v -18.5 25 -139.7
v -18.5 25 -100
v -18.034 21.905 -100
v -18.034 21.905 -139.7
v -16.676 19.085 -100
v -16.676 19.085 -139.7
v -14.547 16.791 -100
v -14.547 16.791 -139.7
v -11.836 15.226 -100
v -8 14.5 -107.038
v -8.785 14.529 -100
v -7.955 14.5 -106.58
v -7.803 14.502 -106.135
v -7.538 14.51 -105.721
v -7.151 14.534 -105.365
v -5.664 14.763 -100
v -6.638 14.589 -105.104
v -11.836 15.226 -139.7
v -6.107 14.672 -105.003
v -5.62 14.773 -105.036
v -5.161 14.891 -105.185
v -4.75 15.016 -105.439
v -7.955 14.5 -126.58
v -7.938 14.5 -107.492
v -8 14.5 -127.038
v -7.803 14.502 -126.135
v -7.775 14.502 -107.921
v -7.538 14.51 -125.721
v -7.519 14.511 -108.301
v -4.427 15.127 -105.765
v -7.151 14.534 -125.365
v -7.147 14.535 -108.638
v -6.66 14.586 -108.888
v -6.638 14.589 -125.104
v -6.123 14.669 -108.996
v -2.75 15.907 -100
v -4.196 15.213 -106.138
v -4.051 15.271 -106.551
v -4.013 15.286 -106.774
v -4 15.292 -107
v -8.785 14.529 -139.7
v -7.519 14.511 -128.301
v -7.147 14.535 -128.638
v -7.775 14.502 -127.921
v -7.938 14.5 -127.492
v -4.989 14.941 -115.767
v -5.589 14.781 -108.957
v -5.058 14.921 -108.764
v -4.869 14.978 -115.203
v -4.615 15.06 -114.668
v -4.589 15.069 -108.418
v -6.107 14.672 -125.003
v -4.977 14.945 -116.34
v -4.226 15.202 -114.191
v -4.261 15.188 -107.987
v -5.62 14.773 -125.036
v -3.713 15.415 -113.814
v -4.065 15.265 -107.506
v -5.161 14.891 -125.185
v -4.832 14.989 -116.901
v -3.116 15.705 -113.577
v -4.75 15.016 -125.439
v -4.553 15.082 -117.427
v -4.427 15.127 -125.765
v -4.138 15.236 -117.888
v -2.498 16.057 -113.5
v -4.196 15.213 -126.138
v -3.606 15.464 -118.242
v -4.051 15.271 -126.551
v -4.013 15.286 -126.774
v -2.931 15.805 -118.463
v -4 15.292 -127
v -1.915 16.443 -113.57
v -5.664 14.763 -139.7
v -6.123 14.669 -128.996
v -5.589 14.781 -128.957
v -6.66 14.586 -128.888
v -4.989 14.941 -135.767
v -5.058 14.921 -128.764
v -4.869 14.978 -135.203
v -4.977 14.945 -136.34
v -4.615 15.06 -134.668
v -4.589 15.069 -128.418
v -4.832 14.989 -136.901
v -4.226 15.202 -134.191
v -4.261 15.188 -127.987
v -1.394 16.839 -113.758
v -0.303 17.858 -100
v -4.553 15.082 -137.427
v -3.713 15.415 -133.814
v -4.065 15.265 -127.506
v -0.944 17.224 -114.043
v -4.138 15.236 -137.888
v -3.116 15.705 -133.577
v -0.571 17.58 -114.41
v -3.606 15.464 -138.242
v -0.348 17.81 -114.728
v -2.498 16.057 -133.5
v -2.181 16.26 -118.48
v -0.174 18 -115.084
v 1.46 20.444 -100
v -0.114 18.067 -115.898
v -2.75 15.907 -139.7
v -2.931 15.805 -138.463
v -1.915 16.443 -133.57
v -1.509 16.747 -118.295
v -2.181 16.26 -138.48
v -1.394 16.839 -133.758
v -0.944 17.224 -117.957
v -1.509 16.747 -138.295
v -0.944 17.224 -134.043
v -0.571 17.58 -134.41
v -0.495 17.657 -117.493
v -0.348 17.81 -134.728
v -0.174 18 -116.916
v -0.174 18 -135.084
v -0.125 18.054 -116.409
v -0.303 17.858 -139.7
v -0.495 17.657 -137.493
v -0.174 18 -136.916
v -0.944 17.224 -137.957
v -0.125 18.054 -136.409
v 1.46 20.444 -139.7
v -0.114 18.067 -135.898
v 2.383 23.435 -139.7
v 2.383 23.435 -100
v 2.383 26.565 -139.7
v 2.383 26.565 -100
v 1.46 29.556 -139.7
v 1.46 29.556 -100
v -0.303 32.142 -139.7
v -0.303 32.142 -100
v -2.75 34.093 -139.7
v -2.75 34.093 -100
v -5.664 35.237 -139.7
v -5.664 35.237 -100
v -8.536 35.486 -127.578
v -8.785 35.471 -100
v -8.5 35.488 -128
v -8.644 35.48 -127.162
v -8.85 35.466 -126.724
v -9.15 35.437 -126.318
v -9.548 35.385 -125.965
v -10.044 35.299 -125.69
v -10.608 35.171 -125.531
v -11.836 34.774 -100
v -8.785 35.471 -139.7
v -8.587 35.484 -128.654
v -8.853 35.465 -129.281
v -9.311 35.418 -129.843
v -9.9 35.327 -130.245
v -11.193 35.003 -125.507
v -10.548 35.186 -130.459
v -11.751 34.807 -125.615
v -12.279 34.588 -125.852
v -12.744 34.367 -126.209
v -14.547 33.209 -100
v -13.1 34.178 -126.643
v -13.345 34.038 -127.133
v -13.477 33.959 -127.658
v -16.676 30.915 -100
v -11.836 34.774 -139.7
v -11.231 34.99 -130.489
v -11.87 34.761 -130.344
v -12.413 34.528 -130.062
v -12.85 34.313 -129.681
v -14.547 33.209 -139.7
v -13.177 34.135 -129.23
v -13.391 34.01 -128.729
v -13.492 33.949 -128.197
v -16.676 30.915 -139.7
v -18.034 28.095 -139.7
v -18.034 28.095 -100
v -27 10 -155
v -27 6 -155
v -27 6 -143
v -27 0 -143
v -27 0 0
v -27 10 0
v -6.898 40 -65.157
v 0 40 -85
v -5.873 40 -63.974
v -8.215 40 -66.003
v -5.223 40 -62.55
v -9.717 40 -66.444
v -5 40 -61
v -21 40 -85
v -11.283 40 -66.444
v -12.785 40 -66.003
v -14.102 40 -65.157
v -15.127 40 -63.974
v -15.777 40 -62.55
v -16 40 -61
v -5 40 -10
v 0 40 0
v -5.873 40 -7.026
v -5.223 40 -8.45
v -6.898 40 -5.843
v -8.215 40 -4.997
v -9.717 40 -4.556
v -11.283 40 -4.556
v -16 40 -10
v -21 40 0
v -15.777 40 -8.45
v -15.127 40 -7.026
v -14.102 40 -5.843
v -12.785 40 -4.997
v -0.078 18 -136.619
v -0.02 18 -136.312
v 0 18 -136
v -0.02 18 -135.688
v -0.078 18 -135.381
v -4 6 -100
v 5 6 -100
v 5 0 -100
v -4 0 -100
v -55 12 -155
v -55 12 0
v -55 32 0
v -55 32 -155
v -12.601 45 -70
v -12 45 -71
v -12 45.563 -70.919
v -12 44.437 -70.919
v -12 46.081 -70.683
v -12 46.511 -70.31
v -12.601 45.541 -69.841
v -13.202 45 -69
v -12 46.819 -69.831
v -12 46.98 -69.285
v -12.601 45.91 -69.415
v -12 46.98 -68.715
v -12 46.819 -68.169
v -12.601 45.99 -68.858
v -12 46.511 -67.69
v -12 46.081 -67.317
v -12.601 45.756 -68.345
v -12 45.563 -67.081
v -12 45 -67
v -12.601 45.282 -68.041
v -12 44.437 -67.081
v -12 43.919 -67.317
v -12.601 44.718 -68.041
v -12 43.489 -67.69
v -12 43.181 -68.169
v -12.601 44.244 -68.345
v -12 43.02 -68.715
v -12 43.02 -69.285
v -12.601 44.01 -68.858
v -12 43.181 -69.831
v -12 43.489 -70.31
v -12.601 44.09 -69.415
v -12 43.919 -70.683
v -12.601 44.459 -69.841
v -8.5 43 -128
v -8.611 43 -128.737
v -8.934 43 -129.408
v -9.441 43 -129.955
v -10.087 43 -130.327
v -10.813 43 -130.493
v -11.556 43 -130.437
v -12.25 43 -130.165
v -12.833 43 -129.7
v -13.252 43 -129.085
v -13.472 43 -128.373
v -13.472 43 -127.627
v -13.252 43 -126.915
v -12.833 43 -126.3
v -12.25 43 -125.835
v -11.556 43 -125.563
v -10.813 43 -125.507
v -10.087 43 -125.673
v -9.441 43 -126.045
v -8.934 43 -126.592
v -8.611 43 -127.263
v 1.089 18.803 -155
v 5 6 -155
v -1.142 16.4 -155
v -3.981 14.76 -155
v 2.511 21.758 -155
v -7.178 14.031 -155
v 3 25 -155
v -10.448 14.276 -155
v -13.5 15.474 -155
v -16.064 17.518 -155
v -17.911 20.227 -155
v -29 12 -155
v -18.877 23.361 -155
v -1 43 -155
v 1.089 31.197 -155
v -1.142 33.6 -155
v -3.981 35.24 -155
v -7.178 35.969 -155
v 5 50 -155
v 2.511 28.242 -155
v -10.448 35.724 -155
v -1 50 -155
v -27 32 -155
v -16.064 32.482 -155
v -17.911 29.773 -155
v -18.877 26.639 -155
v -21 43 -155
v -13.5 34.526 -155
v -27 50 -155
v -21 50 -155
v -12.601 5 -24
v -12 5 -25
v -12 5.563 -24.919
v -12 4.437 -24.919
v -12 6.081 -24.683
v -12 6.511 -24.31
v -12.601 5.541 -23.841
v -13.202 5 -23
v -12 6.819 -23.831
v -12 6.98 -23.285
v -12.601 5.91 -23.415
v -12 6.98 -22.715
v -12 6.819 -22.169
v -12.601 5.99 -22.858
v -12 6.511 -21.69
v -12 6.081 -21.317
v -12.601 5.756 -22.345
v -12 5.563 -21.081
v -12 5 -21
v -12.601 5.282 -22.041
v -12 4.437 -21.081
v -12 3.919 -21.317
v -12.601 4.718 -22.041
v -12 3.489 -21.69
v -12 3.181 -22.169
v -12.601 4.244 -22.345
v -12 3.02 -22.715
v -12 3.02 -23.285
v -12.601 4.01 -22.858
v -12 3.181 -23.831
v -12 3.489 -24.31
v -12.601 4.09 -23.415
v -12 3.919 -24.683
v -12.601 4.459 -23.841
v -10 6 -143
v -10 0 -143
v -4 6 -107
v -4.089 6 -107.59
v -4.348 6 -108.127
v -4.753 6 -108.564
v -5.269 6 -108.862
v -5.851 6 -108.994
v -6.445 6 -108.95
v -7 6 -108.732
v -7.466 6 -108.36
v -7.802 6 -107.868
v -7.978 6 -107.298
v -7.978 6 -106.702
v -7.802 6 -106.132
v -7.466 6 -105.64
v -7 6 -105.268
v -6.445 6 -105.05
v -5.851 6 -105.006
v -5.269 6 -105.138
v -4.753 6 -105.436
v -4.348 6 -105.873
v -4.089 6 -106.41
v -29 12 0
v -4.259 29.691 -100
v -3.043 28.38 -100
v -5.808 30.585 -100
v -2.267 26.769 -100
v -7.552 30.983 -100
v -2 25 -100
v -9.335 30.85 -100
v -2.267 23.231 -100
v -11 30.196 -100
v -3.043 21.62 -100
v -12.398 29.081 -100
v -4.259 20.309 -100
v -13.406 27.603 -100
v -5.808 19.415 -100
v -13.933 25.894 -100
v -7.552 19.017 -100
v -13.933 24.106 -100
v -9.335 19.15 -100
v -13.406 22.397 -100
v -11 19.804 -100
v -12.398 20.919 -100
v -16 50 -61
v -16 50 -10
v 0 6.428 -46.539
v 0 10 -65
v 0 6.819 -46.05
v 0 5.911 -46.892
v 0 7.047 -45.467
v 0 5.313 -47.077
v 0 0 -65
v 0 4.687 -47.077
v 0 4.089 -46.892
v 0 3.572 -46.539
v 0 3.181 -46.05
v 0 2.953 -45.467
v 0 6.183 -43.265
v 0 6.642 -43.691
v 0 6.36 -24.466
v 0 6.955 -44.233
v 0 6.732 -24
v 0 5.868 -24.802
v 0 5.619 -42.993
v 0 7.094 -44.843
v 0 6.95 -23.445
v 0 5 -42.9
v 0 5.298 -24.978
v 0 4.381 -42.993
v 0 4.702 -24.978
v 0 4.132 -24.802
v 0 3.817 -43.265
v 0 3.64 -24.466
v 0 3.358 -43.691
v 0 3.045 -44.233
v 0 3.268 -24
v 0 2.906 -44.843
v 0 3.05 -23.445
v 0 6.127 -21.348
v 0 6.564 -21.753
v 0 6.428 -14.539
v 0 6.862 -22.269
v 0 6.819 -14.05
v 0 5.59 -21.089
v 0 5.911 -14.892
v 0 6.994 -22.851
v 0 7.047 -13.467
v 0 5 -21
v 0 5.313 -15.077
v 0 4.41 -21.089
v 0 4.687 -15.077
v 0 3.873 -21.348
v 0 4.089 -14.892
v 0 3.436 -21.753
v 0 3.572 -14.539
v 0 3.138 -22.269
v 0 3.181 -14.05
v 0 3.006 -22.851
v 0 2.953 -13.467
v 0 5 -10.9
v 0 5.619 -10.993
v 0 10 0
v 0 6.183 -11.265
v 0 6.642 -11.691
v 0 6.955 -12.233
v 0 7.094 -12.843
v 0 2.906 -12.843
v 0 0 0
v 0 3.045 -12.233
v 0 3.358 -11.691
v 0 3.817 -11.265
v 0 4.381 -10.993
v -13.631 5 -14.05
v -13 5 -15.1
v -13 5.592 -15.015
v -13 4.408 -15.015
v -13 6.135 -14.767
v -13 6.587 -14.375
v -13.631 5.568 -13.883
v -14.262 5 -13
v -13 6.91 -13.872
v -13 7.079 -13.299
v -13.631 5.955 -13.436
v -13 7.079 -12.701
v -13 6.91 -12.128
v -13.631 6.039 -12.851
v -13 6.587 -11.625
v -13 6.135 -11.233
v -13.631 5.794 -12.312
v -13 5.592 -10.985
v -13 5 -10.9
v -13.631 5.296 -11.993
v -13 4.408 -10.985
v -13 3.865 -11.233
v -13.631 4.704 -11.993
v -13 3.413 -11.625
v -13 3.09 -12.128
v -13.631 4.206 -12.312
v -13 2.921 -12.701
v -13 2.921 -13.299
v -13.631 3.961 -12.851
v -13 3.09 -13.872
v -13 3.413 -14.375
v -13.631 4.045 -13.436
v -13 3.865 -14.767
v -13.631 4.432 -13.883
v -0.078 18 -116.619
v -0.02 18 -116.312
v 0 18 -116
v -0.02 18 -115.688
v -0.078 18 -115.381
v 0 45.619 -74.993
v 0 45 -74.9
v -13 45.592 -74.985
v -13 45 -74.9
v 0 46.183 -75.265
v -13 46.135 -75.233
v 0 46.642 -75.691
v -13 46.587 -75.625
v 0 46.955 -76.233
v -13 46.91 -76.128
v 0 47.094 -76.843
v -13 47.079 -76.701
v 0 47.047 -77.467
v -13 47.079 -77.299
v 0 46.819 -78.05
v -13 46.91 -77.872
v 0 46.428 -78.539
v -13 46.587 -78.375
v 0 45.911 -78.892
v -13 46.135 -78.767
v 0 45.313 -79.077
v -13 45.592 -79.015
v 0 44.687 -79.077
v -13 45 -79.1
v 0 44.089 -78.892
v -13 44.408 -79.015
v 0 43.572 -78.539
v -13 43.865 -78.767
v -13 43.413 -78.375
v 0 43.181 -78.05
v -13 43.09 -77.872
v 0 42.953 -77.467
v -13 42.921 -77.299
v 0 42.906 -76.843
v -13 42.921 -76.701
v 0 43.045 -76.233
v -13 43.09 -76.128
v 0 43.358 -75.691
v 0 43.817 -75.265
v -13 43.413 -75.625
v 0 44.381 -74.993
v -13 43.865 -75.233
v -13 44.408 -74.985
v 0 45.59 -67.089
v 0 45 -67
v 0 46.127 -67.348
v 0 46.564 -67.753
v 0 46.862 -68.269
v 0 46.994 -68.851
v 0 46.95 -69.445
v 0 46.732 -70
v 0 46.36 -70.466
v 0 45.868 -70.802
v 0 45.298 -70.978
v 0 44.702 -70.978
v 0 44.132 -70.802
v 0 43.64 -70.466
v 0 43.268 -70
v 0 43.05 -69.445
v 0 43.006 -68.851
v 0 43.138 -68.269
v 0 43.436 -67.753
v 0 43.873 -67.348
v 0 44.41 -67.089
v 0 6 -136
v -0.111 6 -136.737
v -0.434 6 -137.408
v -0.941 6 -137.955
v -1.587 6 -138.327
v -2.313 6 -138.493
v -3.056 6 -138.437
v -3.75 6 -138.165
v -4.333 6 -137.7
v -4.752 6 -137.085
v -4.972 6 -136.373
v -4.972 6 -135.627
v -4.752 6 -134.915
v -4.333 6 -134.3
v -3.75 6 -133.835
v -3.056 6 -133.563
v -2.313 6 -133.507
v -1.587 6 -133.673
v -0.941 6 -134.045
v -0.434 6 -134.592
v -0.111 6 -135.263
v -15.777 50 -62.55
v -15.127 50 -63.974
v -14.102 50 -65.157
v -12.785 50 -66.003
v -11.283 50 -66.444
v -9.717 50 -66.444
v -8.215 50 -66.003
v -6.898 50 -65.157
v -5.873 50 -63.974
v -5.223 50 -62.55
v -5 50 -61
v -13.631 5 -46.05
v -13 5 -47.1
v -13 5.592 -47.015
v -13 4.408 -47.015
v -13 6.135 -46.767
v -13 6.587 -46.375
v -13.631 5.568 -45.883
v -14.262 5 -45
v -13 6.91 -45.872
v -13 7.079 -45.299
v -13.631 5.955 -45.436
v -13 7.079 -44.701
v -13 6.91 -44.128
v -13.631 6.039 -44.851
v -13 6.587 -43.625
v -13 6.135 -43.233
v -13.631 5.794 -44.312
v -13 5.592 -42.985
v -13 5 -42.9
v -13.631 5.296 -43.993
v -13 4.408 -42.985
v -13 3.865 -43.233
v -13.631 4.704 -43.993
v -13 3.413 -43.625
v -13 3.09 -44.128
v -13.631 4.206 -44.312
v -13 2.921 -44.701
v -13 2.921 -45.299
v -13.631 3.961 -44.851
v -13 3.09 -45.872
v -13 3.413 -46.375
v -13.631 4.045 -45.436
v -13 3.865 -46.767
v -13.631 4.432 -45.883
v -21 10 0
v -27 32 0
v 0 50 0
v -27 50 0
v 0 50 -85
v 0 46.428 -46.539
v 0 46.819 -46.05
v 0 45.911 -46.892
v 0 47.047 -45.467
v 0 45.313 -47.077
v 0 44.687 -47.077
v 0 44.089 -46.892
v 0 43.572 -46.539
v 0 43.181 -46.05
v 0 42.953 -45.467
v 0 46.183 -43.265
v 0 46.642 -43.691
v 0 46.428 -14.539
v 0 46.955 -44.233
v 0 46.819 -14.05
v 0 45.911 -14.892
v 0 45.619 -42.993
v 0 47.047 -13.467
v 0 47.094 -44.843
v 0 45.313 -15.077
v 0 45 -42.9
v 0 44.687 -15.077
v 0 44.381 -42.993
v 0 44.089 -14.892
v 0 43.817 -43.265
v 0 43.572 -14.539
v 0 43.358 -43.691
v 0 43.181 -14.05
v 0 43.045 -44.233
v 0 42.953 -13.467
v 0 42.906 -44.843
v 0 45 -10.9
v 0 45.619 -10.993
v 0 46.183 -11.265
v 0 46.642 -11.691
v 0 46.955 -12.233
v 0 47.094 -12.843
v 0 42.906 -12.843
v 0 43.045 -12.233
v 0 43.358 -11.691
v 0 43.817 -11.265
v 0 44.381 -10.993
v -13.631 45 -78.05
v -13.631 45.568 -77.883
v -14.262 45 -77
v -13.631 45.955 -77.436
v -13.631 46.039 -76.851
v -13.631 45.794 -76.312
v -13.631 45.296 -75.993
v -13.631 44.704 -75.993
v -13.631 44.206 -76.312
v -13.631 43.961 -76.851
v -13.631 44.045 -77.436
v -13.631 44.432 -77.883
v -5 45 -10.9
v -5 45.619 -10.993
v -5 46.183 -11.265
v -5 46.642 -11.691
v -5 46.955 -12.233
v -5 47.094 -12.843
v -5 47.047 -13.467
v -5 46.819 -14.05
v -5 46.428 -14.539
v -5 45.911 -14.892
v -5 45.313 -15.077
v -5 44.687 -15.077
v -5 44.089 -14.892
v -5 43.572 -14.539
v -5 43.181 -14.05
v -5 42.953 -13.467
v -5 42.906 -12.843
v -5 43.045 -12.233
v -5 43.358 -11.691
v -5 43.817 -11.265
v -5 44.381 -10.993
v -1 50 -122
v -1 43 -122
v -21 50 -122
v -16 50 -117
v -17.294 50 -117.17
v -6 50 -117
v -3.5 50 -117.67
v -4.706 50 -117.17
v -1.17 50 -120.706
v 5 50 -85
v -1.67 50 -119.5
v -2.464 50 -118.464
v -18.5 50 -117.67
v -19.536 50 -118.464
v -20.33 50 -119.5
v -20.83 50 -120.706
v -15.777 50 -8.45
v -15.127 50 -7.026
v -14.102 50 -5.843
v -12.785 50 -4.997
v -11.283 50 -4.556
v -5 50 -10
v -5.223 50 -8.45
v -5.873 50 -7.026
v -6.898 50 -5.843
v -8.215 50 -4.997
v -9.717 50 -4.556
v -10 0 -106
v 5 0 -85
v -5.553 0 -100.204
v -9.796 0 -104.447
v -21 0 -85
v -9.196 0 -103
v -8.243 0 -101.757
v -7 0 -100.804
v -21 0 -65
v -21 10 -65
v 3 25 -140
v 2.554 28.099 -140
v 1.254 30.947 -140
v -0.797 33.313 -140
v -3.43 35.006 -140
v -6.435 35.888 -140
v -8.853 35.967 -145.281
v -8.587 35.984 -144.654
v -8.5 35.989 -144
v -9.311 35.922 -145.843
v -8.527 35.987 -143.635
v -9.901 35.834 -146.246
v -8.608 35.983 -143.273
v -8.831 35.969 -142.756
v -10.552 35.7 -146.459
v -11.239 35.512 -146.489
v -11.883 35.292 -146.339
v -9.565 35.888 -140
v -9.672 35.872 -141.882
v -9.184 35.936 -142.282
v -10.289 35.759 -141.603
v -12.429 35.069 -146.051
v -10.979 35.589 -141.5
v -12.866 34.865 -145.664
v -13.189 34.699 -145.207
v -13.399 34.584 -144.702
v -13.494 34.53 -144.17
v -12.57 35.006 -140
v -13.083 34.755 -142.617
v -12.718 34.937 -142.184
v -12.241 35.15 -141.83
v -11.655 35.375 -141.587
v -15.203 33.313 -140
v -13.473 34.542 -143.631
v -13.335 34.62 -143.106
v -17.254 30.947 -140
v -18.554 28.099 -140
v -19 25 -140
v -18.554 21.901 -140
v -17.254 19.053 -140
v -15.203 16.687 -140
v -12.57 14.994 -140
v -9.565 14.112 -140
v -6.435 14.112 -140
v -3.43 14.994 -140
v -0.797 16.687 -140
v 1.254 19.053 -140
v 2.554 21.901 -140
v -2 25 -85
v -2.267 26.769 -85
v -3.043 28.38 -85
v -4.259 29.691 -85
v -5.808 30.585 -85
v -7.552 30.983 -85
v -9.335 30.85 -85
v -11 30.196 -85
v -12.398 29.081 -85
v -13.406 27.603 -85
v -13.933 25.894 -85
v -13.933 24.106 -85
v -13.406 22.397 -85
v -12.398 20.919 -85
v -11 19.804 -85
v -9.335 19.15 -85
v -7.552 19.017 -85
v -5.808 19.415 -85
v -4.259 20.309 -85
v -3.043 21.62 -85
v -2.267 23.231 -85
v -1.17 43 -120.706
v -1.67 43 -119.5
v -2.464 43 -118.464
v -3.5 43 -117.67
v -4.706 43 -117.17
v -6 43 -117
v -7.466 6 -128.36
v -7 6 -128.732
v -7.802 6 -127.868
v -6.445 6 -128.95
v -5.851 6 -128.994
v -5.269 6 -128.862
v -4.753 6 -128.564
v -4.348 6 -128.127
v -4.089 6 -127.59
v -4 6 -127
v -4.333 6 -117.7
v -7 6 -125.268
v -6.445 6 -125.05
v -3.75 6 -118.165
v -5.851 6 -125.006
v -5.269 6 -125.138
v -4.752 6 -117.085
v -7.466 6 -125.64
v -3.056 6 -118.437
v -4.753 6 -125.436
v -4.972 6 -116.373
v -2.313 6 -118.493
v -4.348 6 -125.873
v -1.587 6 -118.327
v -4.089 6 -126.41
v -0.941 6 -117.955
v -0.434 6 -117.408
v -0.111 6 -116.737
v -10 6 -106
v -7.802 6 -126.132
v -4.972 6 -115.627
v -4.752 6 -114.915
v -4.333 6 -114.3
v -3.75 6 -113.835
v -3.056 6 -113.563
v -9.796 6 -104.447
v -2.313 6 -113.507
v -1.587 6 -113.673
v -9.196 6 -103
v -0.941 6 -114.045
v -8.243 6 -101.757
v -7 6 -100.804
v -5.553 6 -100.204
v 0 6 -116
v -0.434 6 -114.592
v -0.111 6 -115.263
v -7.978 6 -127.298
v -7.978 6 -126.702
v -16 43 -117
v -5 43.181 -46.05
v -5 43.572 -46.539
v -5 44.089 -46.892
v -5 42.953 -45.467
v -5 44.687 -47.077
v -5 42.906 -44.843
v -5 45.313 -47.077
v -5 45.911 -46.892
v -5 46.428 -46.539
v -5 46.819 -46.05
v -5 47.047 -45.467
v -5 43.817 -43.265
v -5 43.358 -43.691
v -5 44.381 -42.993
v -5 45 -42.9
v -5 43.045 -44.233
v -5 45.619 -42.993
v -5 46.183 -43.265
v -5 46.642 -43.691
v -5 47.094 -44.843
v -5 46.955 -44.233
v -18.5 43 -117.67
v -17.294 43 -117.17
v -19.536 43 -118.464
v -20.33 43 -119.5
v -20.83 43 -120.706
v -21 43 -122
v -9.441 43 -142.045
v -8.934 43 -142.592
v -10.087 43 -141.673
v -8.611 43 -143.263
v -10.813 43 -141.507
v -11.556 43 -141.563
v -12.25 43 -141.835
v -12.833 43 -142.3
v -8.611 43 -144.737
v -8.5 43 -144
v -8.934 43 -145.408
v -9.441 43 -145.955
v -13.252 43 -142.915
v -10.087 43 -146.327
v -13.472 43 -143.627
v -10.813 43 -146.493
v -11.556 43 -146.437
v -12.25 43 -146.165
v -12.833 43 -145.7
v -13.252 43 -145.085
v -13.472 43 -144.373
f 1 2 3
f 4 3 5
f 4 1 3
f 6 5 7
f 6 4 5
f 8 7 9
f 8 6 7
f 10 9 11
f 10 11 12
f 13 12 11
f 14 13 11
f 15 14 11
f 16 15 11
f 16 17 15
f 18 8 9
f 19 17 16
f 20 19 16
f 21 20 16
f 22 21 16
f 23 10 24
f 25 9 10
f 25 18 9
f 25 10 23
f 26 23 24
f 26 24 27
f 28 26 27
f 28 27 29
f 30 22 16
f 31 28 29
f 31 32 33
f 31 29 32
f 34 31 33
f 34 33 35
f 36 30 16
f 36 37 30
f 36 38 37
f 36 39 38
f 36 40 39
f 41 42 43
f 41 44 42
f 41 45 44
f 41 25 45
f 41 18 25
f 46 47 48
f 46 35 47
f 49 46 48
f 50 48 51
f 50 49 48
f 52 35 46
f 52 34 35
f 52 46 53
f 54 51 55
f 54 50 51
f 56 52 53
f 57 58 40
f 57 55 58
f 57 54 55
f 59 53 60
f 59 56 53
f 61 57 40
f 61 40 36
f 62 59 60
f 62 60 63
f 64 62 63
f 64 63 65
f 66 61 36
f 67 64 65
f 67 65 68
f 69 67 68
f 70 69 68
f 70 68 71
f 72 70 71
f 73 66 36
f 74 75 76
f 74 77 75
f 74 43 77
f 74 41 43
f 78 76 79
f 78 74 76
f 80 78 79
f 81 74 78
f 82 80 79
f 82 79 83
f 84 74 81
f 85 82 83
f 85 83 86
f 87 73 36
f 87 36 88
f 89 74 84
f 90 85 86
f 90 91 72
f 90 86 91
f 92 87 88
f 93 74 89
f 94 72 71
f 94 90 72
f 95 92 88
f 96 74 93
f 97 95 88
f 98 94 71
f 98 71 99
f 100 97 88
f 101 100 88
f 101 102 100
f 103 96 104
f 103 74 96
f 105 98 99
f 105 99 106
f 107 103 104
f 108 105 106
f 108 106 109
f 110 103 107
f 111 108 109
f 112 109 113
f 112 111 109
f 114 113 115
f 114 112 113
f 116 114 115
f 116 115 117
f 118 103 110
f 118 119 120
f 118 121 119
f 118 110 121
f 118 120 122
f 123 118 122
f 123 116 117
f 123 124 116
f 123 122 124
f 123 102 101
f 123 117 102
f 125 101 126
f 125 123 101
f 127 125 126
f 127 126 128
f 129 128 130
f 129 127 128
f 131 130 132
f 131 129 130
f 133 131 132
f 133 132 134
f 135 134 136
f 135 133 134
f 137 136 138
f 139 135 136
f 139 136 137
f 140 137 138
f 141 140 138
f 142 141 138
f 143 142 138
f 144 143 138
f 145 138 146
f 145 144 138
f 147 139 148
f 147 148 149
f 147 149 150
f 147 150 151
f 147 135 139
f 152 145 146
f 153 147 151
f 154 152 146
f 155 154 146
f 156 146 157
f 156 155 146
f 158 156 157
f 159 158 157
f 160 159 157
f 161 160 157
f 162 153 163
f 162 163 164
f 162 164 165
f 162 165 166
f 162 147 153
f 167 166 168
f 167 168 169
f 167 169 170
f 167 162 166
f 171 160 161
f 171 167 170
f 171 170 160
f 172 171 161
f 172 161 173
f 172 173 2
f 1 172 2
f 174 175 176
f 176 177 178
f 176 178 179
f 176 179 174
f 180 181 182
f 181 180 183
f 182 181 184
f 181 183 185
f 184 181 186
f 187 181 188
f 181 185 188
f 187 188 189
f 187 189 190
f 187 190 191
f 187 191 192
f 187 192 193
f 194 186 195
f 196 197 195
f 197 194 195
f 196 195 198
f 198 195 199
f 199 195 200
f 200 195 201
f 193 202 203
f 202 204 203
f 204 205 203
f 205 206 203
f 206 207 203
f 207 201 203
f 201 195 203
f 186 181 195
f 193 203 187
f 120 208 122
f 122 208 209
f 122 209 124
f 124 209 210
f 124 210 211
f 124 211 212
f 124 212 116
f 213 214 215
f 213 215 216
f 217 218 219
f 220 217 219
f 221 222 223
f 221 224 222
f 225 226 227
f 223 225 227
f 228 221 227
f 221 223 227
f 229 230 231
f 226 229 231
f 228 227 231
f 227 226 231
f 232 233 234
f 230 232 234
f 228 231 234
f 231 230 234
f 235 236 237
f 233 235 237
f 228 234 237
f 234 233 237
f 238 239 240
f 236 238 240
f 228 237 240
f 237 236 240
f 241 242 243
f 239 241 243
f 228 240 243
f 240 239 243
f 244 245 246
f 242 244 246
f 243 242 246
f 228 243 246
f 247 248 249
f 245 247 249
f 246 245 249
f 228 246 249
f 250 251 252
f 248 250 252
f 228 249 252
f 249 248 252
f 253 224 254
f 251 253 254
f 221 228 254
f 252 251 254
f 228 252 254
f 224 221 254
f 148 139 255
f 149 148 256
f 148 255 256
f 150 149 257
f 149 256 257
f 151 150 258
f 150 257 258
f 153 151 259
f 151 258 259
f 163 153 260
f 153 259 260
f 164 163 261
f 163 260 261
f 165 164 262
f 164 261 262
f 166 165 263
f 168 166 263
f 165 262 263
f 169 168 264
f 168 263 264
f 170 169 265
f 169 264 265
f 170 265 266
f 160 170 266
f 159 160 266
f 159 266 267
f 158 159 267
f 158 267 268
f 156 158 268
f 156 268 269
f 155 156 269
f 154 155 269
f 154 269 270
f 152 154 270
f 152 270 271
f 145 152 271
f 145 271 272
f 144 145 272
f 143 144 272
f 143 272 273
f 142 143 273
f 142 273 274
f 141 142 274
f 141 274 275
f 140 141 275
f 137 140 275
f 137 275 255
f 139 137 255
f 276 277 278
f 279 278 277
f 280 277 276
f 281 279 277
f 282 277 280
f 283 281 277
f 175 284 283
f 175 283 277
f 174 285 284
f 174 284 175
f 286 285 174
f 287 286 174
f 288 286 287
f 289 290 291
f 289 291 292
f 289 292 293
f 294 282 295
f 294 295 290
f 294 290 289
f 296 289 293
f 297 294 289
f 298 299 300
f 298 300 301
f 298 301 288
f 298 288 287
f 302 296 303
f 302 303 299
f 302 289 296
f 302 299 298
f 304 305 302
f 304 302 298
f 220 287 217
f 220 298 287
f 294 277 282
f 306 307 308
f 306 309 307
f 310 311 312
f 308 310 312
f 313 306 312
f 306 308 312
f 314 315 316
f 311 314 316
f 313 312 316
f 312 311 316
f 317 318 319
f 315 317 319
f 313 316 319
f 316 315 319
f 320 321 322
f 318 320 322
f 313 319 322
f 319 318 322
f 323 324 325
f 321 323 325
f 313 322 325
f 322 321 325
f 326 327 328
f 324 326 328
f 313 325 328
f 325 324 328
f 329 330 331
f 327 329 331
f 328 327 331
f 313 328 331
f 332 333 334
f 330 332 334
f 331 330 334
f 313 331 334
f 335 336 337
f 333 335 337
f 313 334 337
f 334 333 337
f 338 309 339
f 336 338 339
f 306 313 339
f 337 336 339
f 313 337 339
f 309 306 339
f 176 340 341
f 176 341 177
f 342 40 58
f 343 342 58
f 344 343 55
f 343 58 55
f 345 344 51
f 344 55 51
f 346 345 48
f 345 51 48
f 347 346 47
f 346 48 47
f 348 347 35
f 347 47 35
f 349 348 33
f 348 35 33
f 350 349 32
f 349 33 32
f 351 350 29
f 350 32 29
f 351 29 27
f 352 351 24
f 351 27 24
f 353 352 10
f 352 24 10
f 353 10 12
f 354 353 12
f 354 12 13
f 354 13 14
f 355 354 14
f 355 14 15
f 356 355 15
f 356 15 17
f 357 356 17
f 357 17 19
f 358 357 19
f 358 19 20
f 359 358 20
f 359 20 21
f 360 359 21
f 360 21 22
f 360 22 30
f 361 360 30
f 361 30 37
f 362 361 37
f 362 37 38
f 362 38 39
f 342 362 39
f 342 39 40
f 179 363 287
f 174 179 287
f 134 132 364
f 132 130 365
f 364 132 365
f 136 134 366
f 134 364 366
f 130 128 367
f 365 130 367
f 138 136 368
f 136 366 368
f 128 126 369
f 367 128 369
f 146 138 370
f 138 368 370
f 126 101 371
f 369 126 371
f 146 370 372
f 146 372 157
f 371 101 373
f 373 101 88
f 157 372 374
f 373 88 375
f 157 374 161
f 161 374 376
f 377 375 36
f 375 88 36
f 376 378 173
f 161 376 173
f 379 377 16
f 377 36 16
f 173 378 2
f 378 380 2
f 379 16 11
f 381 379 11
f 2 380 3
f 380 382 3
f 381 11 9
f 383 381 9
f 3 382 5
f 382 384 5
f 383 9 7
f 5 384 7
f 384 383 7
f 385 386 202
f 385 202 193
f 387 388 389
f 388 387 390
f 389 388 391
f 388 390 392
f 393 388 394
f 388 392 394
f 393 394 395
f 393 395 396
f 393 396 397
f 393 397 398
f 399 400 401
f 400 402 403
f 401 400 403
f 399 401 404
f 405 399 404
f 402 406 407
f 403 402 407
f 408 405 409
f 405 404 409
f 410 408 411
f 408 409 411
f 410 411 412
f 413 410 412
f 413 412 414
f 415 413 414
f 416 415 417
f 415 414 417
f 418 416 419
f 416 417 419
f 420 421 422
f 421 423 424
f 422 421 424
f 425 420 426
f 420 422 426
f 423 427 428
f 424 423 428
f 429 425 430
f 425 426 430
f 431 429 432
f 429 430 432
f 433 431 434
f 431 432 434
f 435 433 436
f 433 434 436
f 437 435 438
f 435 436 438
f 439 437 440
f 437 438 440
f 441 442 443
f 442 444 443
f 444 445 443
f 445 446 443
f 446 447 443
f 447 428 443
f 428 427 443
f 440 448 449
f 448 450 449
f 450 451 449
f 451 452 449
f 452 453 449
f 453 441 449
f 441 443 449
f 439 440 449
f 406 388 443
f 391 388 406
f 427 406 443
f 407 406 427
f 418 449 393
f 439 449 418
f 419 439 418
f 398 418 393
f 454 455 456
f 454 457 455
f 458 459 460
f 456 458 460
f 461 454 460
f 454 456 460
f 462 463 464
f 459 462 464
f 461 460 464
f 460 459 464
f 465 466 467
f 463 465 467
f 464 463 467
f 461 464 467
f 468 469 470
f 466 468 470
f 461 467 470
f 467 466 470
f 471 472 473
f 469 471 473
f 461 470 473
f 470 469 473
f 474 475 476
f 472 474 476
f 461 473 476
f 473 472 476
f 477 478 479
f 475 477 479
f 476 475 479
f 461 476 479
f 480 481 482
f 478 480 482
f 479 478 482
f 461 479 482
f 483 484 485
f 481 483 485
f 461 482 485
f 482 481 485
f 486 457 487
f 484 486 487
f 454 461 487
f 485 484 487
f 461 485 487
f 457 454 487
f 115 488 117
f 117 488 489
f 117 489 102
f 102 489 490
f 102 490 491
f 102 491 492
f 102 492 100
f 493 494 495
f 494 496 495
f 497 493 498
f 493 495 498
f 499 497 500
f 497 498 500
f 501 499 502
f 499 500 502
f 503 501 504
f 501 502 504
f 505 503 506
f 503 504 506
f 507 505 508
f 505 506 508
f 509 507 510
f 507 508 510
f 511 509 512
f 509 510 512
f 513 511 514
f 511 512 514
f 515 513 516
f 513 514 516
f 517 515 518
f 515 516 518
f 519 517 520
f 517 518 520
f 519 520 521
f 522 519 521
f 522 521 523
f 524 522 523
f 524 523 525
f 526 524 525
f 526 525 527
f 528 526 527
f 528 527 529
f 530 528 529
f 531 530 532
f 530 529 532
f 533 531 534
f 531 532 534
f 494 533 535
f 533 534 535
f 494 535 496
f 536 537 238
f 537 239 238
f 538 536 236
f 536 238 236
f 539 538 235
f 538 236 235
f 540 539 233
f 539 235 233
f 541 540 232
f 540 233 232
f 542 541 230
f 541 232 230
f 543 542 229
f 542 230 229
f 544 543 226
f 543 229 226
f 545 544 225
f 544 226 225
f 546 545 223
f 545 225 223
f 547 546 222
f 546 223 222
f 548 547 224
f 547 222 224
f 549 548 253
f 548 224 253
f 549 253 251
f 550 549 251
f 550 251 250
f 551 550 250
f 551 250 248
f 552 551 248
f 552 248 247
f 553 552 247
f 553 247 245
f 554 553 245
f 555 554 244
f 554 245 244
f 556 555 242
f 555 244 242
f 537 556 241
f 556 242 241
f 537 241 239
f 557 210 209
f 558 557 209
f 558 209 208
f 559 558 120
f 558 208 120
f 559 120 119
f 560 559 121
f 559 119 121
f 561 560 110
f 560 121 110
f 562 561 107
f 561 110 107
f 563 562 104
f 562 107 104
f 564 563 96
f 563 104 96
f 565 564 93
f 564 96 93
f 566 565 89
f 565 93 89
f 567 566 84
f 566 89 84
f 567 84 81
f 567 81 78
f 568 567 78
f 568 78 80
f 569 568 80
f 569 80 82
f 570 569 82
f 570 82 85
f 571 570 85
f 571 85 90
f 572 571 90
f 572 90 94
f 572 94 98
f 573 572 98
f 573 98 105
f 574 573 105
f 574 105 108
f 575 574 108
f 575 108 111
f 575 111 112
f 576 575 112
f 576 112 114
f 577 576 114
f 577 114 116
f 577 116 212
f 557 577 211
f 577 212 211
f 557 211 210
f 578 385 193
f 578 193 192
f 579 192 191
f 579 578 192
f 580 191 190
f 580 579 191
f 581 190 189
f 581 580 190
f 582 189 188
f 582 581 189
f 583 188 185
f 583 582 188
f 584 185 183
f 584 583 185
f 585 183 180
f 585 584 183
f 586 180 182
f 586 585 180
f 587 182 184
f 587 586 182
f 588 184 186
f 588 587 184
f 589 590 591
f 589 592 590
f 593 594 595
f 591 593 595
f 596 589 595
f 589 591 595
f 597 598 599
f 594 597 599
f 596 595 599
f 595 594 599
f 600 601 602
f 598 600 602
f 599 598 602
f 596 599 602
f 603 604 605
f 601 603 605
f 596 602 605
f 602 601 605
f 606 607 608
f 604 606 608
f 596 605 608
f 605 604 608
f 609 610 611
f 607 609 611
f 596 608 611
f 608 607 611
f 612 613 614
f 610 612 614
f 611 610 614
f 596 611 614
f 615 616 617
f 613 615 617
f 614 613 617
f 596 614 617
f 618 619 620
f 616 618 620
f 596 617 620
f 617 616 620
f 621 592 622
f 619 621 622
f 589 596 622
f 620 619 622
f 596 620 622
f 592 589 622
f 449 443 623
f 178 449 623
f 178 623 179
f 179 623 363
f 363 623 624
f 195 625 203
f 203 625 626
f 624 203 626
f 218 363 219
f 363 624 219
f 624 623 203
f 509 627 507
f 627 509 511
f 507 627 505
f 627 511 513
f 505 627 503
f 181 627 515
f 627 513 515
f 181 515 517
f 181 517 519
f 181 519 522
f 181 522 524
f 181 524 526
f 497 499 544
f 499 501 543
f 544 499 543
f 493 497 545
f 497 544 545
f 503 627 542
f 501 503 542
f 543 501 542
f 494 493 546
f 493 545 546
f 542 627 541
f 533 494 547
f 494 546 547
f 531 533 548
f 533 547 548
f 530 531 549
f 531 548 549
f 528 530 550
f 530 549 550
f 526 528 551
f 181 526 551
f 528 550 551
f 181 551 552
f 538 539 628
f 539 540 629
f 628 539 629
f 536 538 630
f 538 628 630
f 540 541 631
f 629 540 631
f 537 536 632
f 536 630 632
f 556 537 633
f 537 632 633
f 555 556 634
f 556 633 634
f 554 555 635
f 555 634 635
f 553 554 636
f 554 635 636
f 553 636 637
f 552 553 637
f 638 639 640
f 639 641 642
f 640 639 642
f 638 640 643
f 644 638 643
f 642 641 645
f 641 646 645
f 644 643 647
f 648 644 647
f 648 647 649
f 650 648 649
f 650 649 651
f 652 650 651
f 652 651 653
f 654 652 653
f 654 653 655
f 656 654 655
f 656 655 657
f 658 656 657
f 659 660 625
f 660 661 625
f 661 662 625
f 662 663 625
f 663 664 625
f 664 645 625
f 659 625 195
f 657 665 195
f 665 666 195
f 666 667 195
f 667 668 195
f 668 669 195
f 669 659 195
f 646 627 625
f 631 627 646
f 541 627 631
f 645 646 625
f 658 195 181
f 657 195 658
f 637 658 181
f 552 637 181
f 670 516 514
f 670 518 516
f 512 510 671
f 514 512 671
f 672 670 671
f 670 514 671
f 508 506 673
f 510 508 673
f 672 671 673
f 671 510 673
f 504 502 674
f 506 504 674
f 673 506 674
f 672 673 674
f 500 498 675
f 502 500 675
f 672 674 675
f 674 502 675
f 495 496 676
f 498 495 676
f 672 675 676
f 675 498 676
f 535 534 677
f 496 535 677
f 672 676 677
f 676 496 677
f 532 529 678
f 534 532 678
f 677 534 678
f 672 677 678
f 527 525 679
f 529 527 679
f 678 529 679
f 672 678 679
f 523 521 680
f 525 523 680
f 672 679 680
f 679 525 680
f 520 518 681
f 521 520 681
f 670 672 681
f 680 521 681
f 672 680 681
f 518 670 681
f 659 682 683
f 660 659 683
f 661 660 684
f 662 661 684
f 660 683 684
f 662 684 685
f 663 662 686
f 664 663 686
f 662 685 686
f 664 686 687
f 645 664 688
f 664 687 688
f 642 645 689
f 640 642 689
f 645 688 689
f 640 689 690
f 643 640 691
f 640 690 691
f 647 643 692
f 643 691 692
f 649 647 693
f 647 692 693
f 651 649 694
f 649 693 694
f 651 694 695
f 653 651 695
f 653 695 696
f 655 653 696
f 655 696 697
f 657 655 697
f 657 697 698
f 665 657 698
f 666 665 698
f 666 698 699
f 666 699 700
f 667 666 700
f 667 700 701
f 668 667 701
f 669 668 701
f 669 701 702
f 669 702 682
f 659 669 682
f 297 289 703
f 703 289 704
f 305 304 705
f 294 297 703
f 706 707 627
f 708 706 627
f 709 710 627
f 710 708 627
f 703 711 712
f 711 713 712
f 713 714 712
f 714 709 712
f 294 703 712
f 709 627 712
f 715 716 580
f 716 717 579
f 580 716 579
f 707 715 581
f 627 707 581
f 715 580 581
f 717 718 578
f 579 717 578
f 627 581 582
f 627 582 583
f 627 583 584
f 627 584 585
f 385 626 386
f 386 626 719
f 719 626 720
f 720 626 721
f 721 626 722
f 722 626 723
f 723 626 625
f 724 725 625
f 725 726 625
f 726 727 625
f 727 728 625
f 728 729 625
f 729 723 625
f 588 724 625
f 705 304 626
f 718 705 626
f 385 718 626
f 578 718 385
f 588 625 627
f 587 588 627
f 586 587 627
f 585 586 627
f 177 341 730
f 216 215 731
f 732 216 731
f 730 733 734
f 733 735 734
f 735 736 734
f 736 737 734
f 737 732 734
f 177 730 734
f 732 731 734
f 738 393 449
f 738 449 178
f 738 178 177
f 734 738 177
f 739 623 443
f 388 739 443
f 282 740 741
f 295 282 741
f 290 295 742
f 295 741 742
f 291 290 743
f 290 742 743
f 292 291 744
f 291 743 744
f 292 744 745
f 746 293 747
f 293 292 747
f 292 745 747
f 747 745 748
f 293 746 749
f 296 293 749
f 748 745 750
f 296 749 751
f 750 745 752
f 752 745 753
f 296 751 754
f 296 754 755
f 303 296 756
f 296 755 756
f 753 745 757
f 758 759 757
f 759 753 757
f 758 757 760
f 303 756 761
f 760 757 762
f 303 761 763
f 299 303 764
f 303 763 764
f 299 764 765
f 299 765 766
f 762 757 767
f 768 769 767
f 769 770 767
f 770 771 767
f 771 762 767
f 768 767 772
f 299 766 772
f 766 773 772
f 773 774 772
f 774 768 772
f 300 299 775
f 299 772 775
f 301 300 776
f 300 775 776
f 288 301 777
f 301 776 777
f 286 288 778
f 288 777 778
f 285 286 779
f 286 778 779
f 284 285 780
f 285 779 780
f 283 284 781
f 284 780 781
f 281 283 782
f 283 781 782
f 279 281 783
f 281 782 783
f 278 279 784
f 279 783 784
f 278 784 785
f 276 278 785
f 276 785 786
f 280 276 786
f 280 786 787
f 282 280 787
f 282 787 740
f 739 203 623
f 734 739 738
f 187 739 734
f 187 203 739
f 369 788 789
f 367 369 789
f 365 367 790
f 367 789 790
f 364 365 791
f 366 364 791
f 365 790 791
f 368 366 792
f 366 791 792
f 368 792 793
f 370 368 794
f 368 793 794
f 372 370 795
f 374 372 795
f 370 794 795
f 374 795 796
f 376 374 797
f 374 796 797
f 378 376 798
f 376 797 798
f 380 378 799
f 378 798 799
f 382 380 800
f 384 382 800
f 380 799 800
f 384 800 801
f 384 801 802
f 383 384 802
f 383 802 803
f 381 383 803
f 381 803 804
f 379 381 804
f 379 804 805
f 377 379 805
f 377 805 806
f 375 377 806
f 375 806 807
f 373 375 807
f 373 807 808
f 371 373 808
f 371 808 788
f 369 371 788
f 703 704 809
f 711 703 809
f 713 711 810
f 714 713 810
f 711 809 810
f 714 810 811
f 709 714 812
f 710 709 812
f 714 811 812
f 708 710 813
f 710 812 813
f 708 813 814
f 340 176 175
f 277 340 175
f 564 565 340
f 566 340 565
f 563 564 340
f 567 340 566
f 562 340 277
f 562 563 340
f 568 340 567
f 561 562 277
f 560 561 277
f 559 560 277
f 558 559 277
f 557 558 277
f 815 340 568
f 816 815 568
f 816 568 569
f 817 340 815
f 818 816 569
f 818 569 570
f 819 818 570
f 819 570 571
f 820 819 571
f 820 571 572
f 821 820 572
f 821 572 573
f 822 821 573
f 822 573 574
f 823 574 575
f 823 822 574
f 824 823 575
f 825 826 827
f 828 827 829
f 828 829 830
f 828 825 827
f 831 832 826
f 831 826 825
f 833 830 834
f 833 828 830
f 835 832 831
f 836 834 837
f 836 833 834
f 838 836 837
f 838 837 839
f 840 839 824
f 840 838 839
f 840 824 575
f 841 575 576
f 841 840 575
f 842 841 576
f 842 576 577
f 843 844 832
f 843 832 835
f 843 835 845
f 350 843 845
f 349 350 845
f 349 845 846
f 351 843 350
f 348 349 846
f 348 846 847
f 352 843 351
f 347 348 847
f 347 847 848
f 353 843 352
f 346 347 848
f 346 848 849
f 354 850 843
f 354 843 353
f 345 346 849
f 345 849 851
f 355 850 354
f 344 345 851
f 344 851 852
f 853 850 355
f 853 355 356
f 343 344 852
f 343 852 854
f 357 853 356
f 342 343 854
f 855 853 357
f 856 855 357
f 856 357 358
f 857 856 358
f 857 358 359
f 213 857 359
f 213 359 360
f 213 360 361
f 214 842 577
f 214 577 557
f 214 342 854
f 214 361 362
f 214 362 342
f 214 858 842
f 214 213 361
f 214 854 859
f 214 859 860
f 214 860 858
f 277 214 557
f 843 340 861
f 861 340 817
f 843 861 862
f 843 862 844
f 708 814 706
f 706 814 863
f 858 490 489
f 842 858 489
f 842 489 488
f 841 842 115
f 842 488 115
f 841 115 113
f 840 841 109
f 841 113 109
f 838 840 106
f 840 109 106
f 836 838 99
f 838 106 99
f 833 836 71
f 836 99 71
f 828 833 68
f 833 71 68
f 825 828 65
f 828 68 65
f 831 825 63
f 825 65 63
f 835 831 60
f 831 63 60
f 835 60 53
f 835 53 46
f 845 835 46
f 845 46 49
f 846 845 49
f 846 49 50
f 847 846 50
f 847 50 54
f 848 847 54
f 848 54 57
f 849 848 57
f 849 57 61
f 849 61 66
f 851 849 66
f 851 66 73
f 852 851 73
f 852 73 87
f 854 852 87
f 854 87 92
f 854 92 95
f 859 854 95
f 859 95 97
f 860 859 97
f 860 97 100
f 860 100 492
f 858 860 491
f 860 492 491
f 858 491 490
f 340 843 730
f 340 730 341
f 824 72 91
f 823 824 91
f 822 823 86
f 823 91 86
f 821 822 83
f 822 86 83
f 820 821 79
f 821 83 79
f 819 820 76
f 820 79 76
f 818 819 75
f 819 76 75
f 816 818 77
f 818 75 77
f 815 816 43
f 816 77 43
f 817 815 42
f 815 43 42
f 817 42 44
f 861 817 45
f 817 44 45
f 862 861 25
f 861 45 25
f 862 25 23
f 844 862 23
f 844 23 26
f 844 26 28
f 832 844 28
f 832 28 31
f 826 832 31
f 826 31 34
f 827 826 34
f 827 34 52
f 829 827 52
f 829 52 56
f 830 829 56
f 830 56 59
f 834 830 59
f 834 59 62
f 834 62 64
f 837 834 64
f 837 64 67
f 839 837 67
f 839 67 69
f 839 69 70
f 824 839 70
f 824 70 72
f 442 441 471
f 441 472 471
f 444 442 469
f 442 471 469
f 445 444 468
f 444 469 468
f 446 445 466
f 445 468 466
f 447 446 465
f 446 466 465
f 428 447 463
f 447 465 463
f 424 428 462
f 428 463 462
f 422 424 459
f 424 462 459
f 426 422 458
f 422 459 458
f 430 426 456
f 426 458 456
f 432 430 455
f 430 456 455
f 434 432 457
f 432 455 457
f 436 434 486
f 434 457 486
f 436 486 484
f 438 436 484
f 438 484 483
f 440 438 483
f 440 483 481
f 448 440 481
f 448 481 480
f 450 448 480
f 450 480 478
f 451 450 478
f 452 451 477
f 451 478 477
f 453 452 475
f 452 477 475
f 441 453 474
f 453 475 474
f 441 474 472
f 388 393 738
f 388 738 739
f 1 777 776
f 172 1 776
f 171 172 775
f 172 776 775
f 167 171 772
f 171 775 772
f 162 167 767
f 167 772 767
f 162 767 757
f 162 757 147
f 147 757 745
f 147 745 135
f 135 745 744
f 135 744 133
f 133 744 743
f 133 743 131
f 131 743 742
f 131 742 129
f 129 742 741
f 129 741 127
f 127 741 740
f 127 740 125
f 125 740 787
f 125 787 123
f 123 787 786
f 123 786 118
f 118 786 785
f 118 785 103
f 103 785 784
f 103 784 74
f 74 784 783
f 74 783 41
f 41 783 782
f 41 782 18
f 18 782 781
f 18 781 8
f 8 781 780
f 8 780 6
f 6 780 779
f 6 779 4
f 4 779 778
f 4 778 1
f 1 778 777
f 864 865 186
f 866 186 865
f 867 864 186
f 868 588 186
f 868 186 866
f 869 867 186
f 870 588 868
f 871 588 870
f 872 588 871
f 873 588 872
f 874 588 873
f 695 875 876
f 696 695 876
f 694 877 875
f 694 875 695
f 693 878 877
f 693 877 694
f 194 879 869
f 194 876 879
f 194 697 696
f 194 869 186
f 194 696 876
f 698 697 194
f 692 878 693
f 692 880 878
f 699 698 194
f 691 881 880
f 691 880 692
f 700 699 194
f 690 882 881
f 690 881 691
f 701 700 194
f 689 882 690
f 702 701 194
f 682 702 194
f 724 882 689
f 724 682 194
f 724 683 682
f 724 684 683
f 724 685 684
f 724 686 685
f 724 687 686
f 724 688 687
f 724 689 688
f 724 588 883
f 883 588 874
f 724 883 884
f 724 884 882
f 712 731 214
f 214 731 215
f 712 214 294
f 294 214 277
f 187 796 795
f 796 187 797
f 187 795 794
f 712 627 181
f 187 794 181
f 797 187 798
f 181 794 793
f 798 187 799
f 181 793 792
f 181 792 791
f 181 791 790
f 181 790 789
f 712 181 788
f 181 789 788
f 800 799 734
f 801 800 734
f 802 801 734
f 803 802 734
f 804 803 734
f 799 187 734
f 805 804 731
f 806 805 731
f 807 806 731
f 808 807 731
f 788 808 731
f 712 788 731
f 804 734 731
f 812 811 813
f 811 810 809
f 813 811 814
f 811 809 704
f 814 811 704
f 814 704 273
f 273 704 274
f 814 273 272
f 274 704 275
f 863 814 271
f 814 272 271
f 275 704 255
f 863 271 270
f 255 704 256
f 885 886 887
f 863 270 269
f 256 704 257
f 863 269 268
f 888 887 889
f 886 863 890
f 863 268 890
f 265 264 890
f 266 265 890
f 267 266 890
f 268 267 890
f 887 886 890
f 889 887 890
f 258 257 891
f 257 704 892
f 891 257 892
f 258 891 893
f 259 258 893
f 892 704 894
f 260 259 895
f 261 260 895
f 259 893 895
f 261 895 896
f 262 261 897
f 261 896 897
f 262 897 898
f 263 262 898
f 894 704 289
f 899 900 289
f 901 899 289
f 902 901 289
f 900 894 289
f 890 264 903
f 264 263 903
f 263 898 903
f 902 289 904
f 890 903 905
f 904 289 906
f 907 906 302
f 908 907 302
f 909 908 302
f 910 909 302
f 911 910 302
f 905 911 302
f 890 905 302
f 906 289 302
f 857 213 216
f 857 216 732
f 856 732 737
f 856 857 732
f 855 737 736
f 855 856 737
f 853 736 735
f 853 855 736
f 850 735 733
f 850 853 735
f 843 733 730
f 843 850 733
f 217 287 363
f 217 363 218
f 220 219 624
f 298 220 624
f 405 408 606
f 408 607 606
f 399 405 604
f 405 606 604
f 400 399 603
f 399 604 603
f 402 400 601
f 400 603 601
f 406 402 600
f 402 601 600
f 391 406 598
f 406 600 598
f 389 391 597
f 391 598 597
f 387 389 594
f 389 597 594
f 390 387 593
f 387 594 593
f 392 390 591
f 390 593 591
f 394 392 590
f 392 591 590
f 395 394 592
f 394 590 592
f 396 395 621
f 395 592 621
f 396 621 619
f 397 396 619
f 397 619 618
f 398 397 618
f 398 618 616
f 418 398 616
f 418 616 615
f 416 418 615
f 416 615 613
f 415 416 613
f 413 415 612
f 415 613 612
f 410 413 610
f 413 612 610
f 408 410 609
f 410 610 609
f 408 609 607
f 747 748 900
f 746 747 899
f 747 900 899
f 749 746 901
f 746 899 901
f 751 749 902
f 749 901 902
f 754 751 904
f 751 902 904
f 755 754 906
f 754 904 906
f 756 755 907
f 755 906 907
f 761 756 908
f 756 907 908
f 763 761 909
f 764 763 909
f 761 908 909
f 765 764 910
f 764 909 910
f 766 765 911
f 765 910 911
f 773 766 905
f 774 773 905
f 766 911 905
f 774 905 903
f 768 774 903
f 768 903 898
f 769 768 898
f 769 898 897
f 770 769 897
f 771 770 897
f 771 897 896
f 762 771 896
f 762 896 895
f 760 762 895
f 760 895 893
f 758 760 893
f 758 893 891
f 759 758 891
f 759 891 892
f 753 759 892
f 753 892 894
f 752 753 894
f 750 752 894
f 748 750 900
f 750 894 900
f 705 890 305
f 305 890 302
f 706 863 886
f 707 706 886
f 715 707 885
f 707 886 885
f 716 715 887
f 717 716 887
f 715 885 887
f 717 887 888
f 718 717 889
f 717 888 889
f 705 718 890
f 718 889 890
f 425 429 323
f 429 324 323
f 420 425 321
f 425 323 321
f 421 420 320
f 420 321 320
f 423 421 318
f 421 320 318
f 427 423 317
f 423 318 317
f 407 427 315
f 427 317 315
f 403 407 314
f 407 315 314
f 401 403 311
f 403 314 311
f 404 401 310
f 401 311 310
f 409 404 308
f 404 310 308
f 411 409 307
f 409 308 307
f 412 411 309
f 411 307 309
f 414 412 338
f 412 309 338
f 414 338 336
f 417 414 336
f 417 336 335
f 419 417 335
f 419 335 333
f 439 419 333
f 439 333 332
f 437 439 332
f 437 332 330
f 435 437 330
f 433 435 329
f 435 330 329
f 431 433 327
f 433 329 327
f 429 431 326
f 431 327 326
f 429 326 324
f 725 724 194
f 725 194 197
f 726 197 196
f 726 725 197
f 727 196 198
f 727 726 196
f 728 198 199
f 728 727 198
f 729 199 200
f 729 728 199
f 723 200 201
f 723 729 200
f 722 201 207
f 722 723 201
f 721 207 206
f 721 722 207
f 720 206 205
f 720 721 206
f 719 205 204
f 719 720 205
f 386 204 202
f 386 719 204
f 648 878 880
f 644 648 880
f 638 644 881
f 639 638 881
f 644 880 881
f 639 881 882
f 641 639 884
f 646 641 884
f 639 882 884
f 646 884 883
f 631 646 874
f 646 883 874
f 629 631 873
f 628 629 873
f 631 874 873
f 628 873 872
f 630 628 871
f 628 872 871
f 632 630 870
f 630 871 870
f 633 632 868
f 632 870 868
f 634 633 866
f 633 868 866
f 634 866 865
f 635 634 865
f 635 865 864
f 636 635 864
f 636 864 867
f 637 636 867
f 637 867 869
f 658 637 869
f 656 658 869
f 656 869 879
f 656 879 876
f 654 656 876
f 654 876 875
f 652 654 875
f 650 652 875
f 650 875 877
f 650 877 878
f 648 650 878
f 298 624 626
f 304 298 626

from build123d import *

# Parameters (mm, degrees)
EXTRUDE_1_DEPTH          = 155
EXTRUDE_2_REACH          = 173.901
SKETCH_2_W               = 32
SKETCH_2_H               = 70
CUT_EXTRUDE_1_DEPTH      = 172.901134377
CUT_EXTRUDE_1_DEPTH_BACK = 7
CUT_EXTRUDE_2_REACH      = 173.901
CUT_EXTRUDE_3_REACH      = 114.916
SKETCH_5_R               = 6
CUT_EXTRUDE_START        = -70
SKETCH_6_R               = 10.5
CUT_EXTRUDE_4_DEPTH      = 55
M24X2_0_1_D              = 22
M24X2_0_1_DEPTH          = 15
M24X2_0_1_TIP            = 6.609466809
HOLE_WIZARD_M6_1_REACH   = 171.997
HOLE_WIZARD_M6_1_BORE_R  = 2.5
HOLE_WIZARD_M5_1_D       = 4.2
HOLE_WIZARD_M5_1_DEPTH   = 5
SKETCH_15_W              = 20
SKETCH_15_H              = 10
CUT_EXTRUDE_5_DEPTH      = 21
HOLE_WIZARD_M5_2_D       = 4.2
HOLE_WIZARD_M5_2_DEPTH   = 13
HOLE_WIZARD_M5_2_TIP     = 1.2618073
F_4_0MM_1_D              = 4
F_4_0MM_1_DEPTH          = 12
F_4_0MM_1_TIP            = 1.201721238
CUT_EXTRUDE_7_DEPTH      = 172.901134467
CUT_EXTRUDE_7_DEPTH_BACK = 6
F_4_0MM_2_D              = 4
F_4_0MM_2_DEPTH          = 10
F_4_0MM_2_TIP            = 1.201721238
HOLE_WIZARD_M6_2_D       = 5
HOLE_WIZARD_M6_2_DEPTH   = 12
HOLE_WIZARD_M6_2_TIP     = 1.502151548
CHAMFER_1_SIZE           = 2


with BuildPart() as part:
    # 草图1 → 凸台-拉伸1 (new body)
    with BuildSketch(Plane.XY):
        Polygon((0, 0), (-27, 0), (-27, 12), (-55, 12), (-55, 32), (-27, 32), (-27, 50), (0, 50), (0, 40), (-21, 40), (-21, 10), (0, 10), align=None)
    extrude(amount=-EXTRUDE_1_DEPTH)

    # 凸台-拉伸2: up to this face of the body (flat: up to its plane)
    extrude_2_end = Plane(part.part.faces().sort_by_distance((-13.5, 50, -77.5))[0])
    # 草图2 → 凸台-拉伸2 (add, up to the picked face)
    with BuildSketch(Plane(origin=(0, 0, 0), x_dir=(1, 0, 0), z_dir=(0, 1, 0)), mode=Mode.PRIVATE) as extrude_2_sk1:
        with Locations((-11, 120)):
            Rectangle(SKETCH_2_W, SKETCH_2_H)
    extrude_2_tool1 = split(extrude(extrude_2_sk1.sketch, amount=EXTRUDE_2_REACH, mode=Mode.PRIVATE), bisect_by=extrude_2_end, keep=Keep.BOTH, mode=Mode.PRIVATE)
    add(extrude_2_tool1.solids().sort_by(Axis((-11, 0, -120), (0, 1, 0)))[0])

    # 草图3 → 切除-拉伸1 (cut, two sides: drawn at the far end of the back side and taken through both)
    with BuildSketch(Plane(origin=(0, 50, 0), x_dir=(1, 0, 0), z_dir=(0, 1, 0)).offset(-CUT_EXTRUDE_1_DEPTH_BACK)):
        with BuildLine():
            Line((-6, 117), (-16, 117))
            ThreePointArc((-16, 117), (-19.535533906, 118.464466094), (-21, 122))
            Line((-21, 122), (-21, 155))
            Line((-21, 155), (-1, 155))
            Line((-1, 155), (-1, 122))
            ThreePointArc((-1, 122), (-2.464466094, 118.464466094), (-6, 117))
        make_face()
    extrude(amount=CUT_EXTRUDE_1_DEPTH + CUT_EXTRUDE_1_DEPTH_BACK, mode=Mode.SUBTRACT)

    # 草图4 → 切除-拉伸2 (cut, up to next)
    with BuildSketch(Plane(origin=(0, 50, 0), x_dir=(1, 0, 0), z_dir=(0, 1, 0)), mode=Mode.PRIVATE) as cut_extrude_2_sk1:
        with BuildLine():
            Line((-16, 10), (-16, 61))
            ThreePointArc((-16, 61), (-10.5, 66.5), (-5, 61))
            Line((-5, 61), (-5, 10))
            ThreePointArc((-5, 10), (-10.5, 4.5), (-16, 10))
        make_face()
    cut_extrude_2_tool1 = extrude(cut_extrude_2_sk1.sketch, amount=-CUT_EXTRUDE_2_REACH, mode=Mode.PRIVATE) & part.part
    add(cut_extrude_2_tool1.solids().sort_by_distance((-10.5, 50, -35.5))[0], mode=Mode.SUBTRACT)

    # 草图5 → 切除-拉伸3 (cut, up to next)
    with BuildSketch(Plane.XY.offset(-85), mode=Mode.PRIVATE) as cut_extrude_3_sk1:
        with Locations((-8, 25)):
            Circle(SKETCH_5_R)
    cut_extrude_3_tool1 = extrude(cut_extrude_3_sk1.sketch, amount=-CUT_EXTRUDE_3_REACH, mode=Mode.PRIVATE) & part.part
    add(cut_extrude_3_tool1.solids().sort_by_distance((-8, 25, -85))[0], mode=Mode.SUBTRACT)

    # 草图6 → 切除-拉伸4 (cut)
    with BuildSketch(Plane.XY.offset(-85).offset(CUT_EXTRUDE_START)):
        with Locations(Location((-8, 25, 0), (0, 0, 180))):
            Circle(SKETCH_6_R)
    extrude(amount=CUT_EXTRUDE_4_DEPTH, mode=Mode.SUBTRACT)

    # M24x2.0 螺纹孔1
    with Locations(Plane(origin=(0, 0, -155), x_dir=(-1, 0, 0), z_dir=(0, 0, -1))):
        with Locations((8, 25)):
            Hole(M24X2_0_1_D / 2, depth=M24X2_0_1_DEPTH)
            with Locations((0, 0, -(M24X2_0_1_DEPTH + M24X2_0_1_TIP / 2))):  # 118° drill point
                Cone(0, M24X2_0_1_D / 2, M24X2_0_1_TIP, mode=Mode.SUBTRACT)

    # M6 螺纹孔1 bore → M6 螺纹孔1 (cut, up to next)
    with BuildSketch(Plane(origin=(0, 43, 0), x_dir=(1, 0, 0), z_dir=(0, 1, 0)), mode=Mode.PRIVATE) as hole_wizard_m6_1_sk1:
        with Locations((-11, 144)):
            Circle(HOLE_WIZARD_M6_1_BORE_R)
    hole_wizard_m6_1_tool1 = extrude(hole_wizard_m6_1_sk1.sketch, amount=-HOLE_WIZARD_M6_1_REACH, mode=Mode.PRIVATE) & part.part
    # M6 螺纹孔1 bore → M6 螺纹孔1 (cut, up to next)
    with BuildSketch(Plane(origin=(0, 43, 0), x_dir=(1, 0, 0), z_dir=(0, 1, 0)), mode=Mode.PRIVATE) as hole_wizard_m6_1_sk2:
        with Locations((-11, 128)):
            Circle(HOLE_WIZARD_M6_1_BORE_R)
    hole_wizard_m6_1_tool2 = extrude(hole_wizard_m6_1_sk2.sketch, amount=-HOLE_WIZARD_M6_1_REACH, mode=Mode.PRIVATE) & part.part
    add(hole_wizard_m6_1_tool1.solids().sort_by_distance((-11, 43, -144))[0], mode=Mode.SUBTRACT)
    add(hole_wizard_m6_1_tool2.solids().sort_by_distance((-11, 43, -128))[0], mode=Mode.SUBTRACT)

    # M5 螺纹孔1
    with Locations(Plane(origin=(0, 0, 0), x_dir=(0, 0, -1), z_dir=(1, 0, 0))):
        with Locations((13, 45), (45, 45)):
            Hole(HOLE_WIZARD_M5_1_D / 2, depth=HOLE_WIZARD_M5_1_DEPTH)

    # 草图15 → 切除-拉伸5 (cut)
    with BuildSketch(Plane(origin=(0, 0, 0), x_dir=(0, 0, -1), z_dir=(1, 0, 0))):
        with Locations((75, 5)):
            Rectangle(SKETCH_15_W, SKETCH_15_H)
    extrude(amount=-CUT_EXTRUDE_5_DEPTH, mode=Mode.SUBTRACT)

    # M5 螺纹孔2
    with Locations(Plane(origin=(0, 0, 0), x_dir=(0, 0, -1), z_dir=(1, 0, 0))):
        with Locations((13, 5), (45, 5), (77, 45)):
            Hole(HOLE_WIZARD_M5_2_D / 2, depth=HOLE_WIZARD_M5_2_DEPTH)
            with Locations((0, 0, -(HOLE_WIZARD_M5_2_DEPTH + HOLE_WIZARD_M5_2_TIP / 2))):  # 118° drill point
                Cone(0, HOLE_WIZARD_M5_2_D / 2, HOLE_WIZARD_M5_2_TIP, mode=Mode.SUBTRACT)

    # Ø4.0mm 暗销孔1
    with Locations(Plane(origin=(0, 0, 0), x_dir=(0, 0, -1), z_dir=(1, 0, 0))):
        with Locations((23, 5), (69, 45)):
            Hole(F_4_0MM_1_D / 2, depth=F_4_0MM_1_DEPTH)
            with Locations((0, 0, -(F_4_0MM_1_DEPTH + F_4_0MM_1_TIP / 2))):  # 118° drill point
                Cone(0, F_4_0MM_1_D / 2, F_4_0MM_1_TIP, mode=Mode.SUBTRACT)

    # 草图22 → 切除-拉伸7 (cut, two sides: drawn at the far end of the back side and taken through both)
    with BuildSketch(Plane.XZ.offset(-CUT_EXTRUDE_7_DEPTH_BACK)):
        with BuildLine():
            Line((308.073369653, -100), (5, -100))
            Line((5, -100), (-4, -100))
            ThreePointArc((-4, -100), (-8.242640687, -101.757359313), (-10, -106))
            Line((-10, -106), (-10, -143))
            Line((-10, -143), (-27, -143))
            Line((-27, -143), (-330.073369653, -143))
            Line((-330.073369653, -143), (-289.322022823, -747.775327956))
            Line((-289.322022823, -747.775327956), (348.824716484, -704.775327956))
            Line((348.824716484, -704.775327956), (308.073369653, -100))
        make_face()
    extrude(amount=CUT_EXTRUDE_7_DEPTH + CUT_EXTRUDE_7_DEPTH_BACK, mode=Mode.SUBTRACT)

    # Ø4.0mm 暗销孔2
    with Locations(Plane(origin=(0, 6, 0), x_dir=(-1, 0, 0), z_dir=(0, -1, 0))):
        with Locations((6, 127), (6, 107)):
            Hole(F_4_0MM_2_D / 2, depth=F_4_0MM_2_DEPTH)
            with Locations((0, 0, -(F_4_0MM_2_DEPTH + F_4_0MM_2_TIP / 2))):  # 118° drill point
                Cone(0, F_4_0MM_2_D / 2, F_4_0MM_2_TIP, mode=Mode.SUBTRACT)

    # M6 螺纹孔2
    with Locations(Plane(origin=(0, 6, 0), x_dir=(-1, 0, 0), z_dir=(0, -1, 0))):
        with Locations((2.5, 136), (2.5, 116)):
            Hole(HOLE_WIZARD_M6_2_D / 2, depth=HOLE_WIZARD_M6_2_DEPTH)
            with Locations((0, 0, -(HOLE_WIZARD_M6_2_DEPTH + HOLE_WIZARD_M6_2_TIP / 2))):  # 118° drill point
                Cone(0, HOLE_WIZARD_M6_2_D / 2, HOLE_WIZARD_M6_2_TIP, mode=Mode.SUBTRACT)

    # 倒角1
    chamfer_1_edges = [part.edges().sort_by_distance(p)[0] for p in [
        (-27, 12, -77.5),
    ]]
    chamfer(chamfer_1_edges, length=CHAMFER_1_SIZE)


solid = part.part
